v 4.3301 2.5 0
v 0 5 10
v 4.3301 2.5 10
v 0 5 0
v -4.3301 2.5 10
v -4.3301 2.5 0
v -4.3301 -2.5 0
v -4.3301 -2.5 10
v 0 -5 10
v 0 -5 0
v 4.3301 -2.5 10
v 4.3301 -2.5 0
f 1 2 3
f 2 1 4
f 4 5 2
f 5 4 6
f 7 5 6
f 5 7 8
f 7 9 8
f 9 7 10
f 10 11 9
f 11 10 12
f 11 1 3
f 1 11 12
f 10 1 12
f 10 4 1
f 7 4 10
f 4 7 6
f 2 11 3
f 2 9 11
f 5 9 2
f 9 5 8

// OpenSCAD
// file: default.scad
function default(val, def) = is_undef(val) ? def : val;
function assert_defined(name, val) = assert(!is_undef(val), str(name, " not defined")) val;
function count_defined(a, n)
    = is_undef(n)
        ? count_defined(a, len(a))
        : assert(n >= 0) n == 0
            ? 0
            : count_defined(a, n-1)
                + (is_undef(a[n-1]) ? 0 : 1);

assert(count_defined([]) == 0);
assert(count_defined([0]) == 1);
assert(count_defined([undef, 0]) == 1);
assert(count_defined([0, undef]) == 1);
assert(count_defined([0, false]) == 2);
// main file
use <default.scad>

// @brief       Given an [x,y] or an [x,y,z], return an [x,y,z].
// @param   a   A two- or three- element array
// @returns     A three-element array
function make3(a) =
    assert(len(a) == 2 || len(a) == 3)
    len(a) == 3 ? a : concat(a, 0);
    
// @brief       Given an [x,y] or an [x,y,z], return an [x,y],
//              discarding z.
// @param   a   A two- or three- element array
// @returns     A two-element array
function make2(a) =
    assert(len(a) == 2 || len(a) == 3)
    [ a[0], a[1] ];
    
// @brief        Justify children as specified by argument.
// @param center Equivalent to justify=[0,0,0].
// @param j      [jx,jy,jz]:
//                   +1 toward-positive
//                    0 center
//                   -1 toward-negative
// @param bb     Bounding box:
//                   [dimx,dimy,dimz]
//                   [ [ox,oy,oz], [dimx,dimy,dimz] ]
// @children     Object(s) to be justified.
// @note Works for two- or three- dimensional objects.
// @note If more than one object is supplied as a child, they
//       are all justified en mass with respect to the specified
//       bounding box.
module justify(center, j, bb) {
    origin = make3(
        assert(is_list(bb))
        is_list(bb[0])
            ? assert(len(bb) == 2) bb[0]
            : [0,0,0]
    );
    dims = make3(
            is_list(bb[0])
                ? bb[1]
                : bb
    );
    j = make3(default(j, center ? [0,0,0] : [1,1,1]));
    function o(flag, dim) = flag > 0 ? 0 :
        flag < 0 ? -dim :
        -dim/2;
    translate([o(j[0], dims[0]),
        o(j[1], dims[1]),
        o(j[2], dims[2])])
        translate(-origin)  // Move BB minima to [0,0,0]
        children();
}


// @brief        A justified cube
// @param dims   Dimensions of the cube
// @param center Equivalent to j=[0,0,0]
// @param j      As for justify() above
module jcube(dims, center, j) {
    justify(center=center, j=j, bb=dims) cube(dims);
}

module jsquare(dims, center, j) {
    justify(center=center, j=j, bb=dims) square(dims);
}

// OpenSCAD polygons have their radius/diameter
// measured to the vertices.  These functions
// give you the OD given the ID, and vice versa.
function poly_i_to_o(r, n) = r / cos(360/n/2);
function poly_o_to_i(r, n) = r * cos(360/n/2);

function _jcircle_assert_args(name, d, r, id, od, ir, or, d1, r1, id1, ir1, od1, or1) =
    let (c = count_defined([d, r, id, od, ir, or, d1, r1, id1, ir1, od1, or1]))
    assert(c > 0, str(name, ": no parameters"))
    assert(c < 2, str(name, ": too many parameters"))
    undef;

function _jcircle_diameter(name, fn, d, r, id, od, ir, or, d1, r1, id1, ir1, od1, or1)
        = let(junk=_jcircle_assert_args(name=name, d=d, r=r, id=id, od=od, ir=ir, or=or, d1=d1, r1=r1, id1=id1, ir1=ir1, od1=od1, or1=or1))
        !is_undef(od1) ? od1
        : !is_undef(id1) ? poly_i_to_o(id1, fn)
        : !is_undef(or1) ? or1*2
        : !is_undef(ir1) ? poly_i_to_o(ir1, fn)*2
        : !is_undef(d1) ? d1
        : !is_undef(r1) ? r1*2
        : !is_undef(od) ? od
        : !is_undef(id) ? poly_i_to_o(id, fn)
        : !is_undef(or) ? or*2
        : !is_undef(ir) ? poly_i_to_o(ir, fn)*2
        : !is_undef(d) ? d
        : !is_undef(r) ? r*2
        : undef;

// NEEDSWORK needs a j parameter, but note that the j parameter does
// not behave like a normal j.  j=0 needs to put the origin on the center of
// the circle, not on the midpoint of the bounding box.  The two are in
// different places when the number of sides is odd.
// With fn = n*4+2, the top and bottom faces are horizontal, and the left and right sides are vertices.  (Or the other way around, depending on rotation.)  Need to figure out which, and how justification interacts.
module jcircle(d, r, id, od, ir, or, j) {
    fn = !$fn ? 60 : $fn;
    d = _jcircle_diameter(name="d", fn=fn, d=d, r=r, id=id, od=od, ir=ir, or=or);
    vertex_mode = !is_undef(or) || !is_undef(od);
    rotate(vertex_mode ? 0 : 360/$fn/2) circle(d=d);
}

module jcylinder(h, d, r, id, od, ir, or, d1, d2, r1, r2, id1, id2, ir1, ir2, od1, od2, or1, or2, j) {
    fn = !$fn ? 60 : $fn;
    d1 = _jcircle_diameter(name="d1", fn=fn, d=d, r=r, id=id, od=od, ir=ir, or=or, d1=d1, r1=r1, id1=id1, ir1=ir1, od1=od1, or1=or1);
    d2 = _jcircle_diameter(name="d2", fn=fn, d=d, r=r, id=id, od=od, ir=ir, or=or, d1=d2, r1=r2, id1=id2, ir1=ir2, od1=od2, or1=or2);
    rotate([0,0,360/fn/2]) cylinder(h=h, d1=d1, d2=d2, $fn=fn);
}
// NEEDSWORK with odd (or non-multiple-of-4?) sides justification is
// not symmetrical.
// NEEDSWORK with $fn undefined you need the dimensions to derive it.
!jcylinder(h=10, od=10, $fn=6);

// Test/demos
for (xj=[-1:1], yj=[-1:1], zj=[-1:1]) {
    justify(j=[xj,yj,zj], bb=[[-10,-10,-10],[20,20,20]])
        color([(xj+1)/2, (yj+1)/2, (zj+1)/2]) sphere(r=10);
}

translate([30,0]) for (xj=[-1:1], yj=[-1:1]) {
    justify(j=[xj,yj], bb=[[-10,-10],[10,10]])
        color([(xj+1)/2, (yj+1)/2, 0]) circle(r=10);
}
